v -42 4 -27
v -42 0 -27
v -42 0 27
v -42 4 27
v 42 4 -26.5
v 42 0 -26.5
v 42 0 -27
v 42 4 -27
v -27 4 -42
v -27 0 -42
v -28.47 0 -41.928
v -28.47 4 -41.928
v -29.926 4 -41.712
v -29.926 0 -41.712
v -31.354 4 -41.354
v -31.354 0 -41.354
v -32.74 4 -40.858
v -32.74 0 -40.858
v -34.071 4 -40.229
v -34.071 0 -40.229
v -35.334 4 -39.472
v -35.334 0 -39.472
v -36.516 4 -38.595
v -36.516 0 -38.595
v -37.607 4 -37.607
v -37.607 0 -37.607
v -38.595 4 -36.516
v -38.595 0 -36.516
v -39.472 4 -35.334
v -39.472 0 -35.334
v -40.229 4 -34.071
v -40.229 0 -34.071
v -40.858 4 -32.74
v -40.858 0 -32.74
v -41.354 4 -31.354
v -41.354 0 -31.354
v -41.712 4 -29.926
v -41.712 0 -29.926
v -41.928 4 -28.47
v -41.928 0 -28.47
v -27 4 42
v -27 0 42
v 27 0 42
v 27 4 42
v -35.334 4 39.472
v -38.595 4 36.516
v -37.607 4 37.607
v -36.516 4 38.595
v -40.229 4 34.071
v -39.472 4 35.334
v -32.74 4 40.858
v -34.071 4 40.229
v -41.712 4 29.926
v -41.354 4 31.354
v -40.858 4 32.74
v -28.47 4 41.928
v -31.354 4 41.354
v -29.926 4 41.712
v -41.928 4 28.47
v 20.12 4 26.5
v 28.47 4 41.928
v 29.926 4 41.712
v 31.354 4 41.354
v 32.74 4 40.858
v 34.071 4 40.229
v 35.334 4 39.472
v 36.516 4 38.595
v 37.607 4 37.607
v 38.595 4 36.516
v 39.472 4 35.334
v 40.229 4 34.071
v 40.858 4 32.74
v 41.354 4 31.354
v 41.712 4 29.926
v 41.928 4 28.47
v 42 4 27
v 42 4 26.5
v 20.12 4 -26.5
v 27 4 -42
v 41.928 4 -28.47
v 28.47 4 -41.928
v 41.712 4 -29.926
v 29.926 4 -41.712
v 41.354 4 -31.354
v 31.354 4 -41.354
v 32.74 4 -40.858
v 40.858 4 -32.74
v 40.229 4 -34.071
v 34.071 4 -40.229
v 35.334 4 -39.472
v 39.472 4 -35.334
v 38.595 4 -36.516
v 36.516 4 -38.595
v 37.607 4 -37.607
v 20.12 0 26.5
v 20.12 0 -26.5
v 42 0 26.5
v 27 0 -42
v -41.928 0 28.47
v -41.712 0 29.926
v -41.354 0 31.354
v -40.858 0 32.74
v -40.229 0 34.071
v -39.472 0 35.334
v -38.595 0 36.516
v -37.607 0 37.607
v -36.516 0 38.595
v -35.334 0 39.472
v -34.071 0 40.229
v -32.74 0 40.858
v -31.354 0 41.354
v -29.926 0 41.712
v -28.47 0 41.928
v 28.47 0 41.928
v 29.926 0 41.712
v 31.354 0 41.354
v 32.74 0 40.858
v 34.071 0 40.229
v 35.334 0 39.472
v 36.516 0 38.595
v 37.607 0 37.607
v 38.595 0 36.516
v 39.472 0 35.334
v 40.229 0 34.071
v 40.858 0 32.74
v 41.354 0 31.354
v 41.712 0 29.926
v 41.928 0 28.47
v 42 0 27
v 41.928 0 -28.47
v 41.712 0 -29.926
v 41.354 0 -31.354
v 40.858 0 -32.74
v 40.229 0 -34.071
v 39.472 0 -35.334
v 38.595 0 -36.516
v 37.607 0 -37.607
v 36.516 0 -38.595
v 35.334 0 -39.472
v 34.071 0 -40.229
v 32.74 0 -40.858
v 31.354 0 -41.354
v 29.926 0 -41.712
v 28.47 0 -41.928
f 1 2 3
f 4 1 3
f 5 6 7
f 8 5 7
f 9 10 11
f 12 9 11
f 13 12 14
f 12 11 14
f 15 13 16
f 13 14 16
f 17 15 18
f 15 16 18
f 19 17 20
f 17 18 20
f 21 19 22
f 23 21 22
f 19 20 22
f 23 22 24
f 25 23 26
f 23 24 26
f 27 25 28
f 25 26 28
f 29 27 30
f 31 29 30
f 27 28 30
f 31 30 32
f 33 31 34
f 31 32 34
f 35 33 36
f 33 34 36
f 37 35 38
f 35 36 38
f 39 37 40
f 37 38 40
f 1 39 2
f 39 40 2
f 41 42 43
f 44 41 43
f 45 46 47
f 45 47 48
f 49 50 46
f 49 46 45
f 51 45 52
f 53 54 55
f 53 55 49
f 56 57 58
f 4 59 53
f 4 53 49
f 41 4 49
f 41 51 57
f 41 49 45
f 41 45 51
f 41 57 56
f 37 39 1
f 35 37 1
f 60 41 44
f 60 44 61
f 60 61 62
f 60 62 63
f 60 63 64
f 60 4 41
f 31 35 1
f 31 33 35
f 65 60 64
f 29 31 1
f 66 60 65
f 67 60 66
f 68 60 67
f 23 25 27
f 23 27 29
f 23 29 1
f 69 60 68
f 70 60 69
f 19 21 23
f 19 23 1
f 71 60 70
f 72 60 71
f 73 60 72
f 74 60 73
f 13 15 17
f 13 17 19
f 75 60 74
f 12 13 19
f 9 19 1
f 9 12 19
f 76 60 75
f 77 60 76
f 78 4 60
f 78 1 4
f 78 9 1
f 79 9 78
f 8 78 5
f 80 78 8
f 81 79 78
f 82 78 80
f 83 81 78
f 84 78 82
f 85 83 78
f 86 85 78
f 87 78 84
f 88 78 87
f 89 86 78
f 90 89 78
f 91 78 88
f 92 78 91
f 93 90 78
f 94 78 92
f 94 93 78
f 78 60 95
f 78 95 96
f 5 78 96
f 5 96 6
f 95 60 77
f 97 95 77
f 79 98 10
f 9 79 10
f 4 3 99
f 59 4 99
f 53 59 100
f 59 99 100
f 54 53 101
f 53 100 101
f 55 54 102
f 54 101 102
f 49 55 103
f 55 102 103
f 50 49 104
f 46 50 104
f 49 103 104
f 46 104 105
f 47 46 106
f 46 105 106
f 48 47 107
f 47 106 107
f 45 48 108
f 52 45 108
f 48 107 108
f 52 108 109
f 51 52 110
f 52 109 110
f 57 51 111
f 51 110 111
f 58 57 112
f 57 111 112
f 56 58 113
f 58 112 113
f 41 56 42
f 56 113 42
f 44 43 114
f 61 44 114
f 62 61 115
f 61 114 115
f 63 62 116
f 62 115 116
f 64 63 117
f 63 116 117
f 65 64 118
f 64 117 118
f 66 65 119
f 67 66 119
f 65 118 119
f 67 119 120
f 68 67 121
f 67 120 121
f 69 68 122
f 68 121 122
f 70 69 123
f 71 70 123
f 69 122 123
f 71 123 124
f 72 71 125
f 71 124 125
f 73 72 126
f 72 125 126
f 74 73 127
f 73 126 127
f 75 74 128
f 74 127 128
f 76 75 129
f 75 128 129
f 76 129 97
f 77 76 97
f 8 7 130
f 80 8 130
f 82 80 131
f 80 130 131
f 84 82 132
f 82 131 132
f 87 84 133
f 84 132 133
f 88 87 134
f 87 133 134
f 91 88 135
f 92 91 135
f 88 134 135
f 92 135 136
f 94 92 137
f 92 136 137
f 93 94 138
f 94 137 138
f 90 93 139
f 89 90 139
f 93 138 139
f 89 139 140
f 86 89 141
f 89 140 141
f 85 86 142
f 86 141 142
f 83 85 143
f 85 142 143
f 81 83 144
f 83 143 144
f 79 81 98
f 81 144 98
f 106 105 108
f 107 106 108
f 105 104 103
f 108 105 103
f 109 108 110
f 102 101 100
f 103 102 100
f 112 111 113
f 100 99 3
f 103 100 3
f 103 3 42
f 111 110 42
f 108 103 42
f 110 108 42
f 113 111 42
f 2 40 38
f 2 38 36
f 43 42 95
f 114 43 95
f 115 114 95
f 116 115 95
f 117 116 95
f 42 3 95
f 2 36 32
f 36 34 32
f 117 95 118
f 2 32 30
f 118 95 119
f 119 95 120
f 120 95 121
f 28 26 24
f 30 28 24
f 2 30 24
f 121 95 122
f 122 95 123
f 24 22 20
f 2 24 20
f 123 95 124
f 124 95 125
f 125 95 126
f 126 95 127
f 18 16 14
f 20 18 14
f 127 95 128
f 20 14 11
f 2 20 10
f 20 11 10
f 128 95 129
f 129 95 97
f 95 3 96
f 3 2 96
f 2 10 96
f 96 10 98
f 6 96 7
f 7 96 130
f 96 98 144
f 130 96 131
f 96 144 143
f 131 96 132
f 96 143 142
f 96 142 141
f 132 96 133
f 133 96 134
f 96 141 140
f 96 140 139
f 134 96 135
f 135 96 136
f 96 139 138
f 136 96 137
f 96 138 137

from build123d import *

# Parameters (mm, degrees)
BOSS_EXTRUDE1_DEPTH = 4
SKETCH4_W           = 21.88
SKETCH4_H           = 53
CUT_EXTRUDE1_DEPTH  = 4


with BuildPart() as part:
    # Layer1 → Boss-Extrude1 (new body)
    with BuildSketch(Plane(origin=(0, 0, 0), x_dir=(1, 0, 0), z_dir=(0, 1, 0))):
        with BuildLine():
            Line((27, 42), (11.25, 42))
            Line((11.25, 42), (-27, 42))
            ThreePointArc((-27, 42), (-37.606601718, 37.606601718), (-42, 27))
            Line((-42, 27), (-42, 21.5))
            Line((-42, 21.5), (-42, -21.5))
            Line((-42, -21.5), (-42, -27))
            ThreePointArc((-42, -27), (-37.606601718, -37.606601718), (-27, -42))
            Line((-27, -42), (11.25, -42))
            Line((11.25, -42), (27, -42))
            ThreePointArc((27, -42), (37.606601718, -37.606601718), (42, -27))
            Line((42, -27), (42, 27))
            ThreePointArc((42, 27), (37.606601718, 37.606601718), (27, 42))
        make_face()
    extrude(amount=BOSS_EXTRUDE1_DEPTH)

    # Sketch4 → Cut-Extrude1 (cut)
    with BuildSketch(Plane(origin=(0, 4, 0), x_dir=(1, 0, 0), z_dir=(0, 1, 0))):
        with Locations((31.06, 0)):
            Rectangle(SKETCH4_W, SKETCH4_H)
    extrude(amount=-CUT_EXTRUDE1_DEPTH, mode=Mode.SUBTRACT)


solid = part.part
